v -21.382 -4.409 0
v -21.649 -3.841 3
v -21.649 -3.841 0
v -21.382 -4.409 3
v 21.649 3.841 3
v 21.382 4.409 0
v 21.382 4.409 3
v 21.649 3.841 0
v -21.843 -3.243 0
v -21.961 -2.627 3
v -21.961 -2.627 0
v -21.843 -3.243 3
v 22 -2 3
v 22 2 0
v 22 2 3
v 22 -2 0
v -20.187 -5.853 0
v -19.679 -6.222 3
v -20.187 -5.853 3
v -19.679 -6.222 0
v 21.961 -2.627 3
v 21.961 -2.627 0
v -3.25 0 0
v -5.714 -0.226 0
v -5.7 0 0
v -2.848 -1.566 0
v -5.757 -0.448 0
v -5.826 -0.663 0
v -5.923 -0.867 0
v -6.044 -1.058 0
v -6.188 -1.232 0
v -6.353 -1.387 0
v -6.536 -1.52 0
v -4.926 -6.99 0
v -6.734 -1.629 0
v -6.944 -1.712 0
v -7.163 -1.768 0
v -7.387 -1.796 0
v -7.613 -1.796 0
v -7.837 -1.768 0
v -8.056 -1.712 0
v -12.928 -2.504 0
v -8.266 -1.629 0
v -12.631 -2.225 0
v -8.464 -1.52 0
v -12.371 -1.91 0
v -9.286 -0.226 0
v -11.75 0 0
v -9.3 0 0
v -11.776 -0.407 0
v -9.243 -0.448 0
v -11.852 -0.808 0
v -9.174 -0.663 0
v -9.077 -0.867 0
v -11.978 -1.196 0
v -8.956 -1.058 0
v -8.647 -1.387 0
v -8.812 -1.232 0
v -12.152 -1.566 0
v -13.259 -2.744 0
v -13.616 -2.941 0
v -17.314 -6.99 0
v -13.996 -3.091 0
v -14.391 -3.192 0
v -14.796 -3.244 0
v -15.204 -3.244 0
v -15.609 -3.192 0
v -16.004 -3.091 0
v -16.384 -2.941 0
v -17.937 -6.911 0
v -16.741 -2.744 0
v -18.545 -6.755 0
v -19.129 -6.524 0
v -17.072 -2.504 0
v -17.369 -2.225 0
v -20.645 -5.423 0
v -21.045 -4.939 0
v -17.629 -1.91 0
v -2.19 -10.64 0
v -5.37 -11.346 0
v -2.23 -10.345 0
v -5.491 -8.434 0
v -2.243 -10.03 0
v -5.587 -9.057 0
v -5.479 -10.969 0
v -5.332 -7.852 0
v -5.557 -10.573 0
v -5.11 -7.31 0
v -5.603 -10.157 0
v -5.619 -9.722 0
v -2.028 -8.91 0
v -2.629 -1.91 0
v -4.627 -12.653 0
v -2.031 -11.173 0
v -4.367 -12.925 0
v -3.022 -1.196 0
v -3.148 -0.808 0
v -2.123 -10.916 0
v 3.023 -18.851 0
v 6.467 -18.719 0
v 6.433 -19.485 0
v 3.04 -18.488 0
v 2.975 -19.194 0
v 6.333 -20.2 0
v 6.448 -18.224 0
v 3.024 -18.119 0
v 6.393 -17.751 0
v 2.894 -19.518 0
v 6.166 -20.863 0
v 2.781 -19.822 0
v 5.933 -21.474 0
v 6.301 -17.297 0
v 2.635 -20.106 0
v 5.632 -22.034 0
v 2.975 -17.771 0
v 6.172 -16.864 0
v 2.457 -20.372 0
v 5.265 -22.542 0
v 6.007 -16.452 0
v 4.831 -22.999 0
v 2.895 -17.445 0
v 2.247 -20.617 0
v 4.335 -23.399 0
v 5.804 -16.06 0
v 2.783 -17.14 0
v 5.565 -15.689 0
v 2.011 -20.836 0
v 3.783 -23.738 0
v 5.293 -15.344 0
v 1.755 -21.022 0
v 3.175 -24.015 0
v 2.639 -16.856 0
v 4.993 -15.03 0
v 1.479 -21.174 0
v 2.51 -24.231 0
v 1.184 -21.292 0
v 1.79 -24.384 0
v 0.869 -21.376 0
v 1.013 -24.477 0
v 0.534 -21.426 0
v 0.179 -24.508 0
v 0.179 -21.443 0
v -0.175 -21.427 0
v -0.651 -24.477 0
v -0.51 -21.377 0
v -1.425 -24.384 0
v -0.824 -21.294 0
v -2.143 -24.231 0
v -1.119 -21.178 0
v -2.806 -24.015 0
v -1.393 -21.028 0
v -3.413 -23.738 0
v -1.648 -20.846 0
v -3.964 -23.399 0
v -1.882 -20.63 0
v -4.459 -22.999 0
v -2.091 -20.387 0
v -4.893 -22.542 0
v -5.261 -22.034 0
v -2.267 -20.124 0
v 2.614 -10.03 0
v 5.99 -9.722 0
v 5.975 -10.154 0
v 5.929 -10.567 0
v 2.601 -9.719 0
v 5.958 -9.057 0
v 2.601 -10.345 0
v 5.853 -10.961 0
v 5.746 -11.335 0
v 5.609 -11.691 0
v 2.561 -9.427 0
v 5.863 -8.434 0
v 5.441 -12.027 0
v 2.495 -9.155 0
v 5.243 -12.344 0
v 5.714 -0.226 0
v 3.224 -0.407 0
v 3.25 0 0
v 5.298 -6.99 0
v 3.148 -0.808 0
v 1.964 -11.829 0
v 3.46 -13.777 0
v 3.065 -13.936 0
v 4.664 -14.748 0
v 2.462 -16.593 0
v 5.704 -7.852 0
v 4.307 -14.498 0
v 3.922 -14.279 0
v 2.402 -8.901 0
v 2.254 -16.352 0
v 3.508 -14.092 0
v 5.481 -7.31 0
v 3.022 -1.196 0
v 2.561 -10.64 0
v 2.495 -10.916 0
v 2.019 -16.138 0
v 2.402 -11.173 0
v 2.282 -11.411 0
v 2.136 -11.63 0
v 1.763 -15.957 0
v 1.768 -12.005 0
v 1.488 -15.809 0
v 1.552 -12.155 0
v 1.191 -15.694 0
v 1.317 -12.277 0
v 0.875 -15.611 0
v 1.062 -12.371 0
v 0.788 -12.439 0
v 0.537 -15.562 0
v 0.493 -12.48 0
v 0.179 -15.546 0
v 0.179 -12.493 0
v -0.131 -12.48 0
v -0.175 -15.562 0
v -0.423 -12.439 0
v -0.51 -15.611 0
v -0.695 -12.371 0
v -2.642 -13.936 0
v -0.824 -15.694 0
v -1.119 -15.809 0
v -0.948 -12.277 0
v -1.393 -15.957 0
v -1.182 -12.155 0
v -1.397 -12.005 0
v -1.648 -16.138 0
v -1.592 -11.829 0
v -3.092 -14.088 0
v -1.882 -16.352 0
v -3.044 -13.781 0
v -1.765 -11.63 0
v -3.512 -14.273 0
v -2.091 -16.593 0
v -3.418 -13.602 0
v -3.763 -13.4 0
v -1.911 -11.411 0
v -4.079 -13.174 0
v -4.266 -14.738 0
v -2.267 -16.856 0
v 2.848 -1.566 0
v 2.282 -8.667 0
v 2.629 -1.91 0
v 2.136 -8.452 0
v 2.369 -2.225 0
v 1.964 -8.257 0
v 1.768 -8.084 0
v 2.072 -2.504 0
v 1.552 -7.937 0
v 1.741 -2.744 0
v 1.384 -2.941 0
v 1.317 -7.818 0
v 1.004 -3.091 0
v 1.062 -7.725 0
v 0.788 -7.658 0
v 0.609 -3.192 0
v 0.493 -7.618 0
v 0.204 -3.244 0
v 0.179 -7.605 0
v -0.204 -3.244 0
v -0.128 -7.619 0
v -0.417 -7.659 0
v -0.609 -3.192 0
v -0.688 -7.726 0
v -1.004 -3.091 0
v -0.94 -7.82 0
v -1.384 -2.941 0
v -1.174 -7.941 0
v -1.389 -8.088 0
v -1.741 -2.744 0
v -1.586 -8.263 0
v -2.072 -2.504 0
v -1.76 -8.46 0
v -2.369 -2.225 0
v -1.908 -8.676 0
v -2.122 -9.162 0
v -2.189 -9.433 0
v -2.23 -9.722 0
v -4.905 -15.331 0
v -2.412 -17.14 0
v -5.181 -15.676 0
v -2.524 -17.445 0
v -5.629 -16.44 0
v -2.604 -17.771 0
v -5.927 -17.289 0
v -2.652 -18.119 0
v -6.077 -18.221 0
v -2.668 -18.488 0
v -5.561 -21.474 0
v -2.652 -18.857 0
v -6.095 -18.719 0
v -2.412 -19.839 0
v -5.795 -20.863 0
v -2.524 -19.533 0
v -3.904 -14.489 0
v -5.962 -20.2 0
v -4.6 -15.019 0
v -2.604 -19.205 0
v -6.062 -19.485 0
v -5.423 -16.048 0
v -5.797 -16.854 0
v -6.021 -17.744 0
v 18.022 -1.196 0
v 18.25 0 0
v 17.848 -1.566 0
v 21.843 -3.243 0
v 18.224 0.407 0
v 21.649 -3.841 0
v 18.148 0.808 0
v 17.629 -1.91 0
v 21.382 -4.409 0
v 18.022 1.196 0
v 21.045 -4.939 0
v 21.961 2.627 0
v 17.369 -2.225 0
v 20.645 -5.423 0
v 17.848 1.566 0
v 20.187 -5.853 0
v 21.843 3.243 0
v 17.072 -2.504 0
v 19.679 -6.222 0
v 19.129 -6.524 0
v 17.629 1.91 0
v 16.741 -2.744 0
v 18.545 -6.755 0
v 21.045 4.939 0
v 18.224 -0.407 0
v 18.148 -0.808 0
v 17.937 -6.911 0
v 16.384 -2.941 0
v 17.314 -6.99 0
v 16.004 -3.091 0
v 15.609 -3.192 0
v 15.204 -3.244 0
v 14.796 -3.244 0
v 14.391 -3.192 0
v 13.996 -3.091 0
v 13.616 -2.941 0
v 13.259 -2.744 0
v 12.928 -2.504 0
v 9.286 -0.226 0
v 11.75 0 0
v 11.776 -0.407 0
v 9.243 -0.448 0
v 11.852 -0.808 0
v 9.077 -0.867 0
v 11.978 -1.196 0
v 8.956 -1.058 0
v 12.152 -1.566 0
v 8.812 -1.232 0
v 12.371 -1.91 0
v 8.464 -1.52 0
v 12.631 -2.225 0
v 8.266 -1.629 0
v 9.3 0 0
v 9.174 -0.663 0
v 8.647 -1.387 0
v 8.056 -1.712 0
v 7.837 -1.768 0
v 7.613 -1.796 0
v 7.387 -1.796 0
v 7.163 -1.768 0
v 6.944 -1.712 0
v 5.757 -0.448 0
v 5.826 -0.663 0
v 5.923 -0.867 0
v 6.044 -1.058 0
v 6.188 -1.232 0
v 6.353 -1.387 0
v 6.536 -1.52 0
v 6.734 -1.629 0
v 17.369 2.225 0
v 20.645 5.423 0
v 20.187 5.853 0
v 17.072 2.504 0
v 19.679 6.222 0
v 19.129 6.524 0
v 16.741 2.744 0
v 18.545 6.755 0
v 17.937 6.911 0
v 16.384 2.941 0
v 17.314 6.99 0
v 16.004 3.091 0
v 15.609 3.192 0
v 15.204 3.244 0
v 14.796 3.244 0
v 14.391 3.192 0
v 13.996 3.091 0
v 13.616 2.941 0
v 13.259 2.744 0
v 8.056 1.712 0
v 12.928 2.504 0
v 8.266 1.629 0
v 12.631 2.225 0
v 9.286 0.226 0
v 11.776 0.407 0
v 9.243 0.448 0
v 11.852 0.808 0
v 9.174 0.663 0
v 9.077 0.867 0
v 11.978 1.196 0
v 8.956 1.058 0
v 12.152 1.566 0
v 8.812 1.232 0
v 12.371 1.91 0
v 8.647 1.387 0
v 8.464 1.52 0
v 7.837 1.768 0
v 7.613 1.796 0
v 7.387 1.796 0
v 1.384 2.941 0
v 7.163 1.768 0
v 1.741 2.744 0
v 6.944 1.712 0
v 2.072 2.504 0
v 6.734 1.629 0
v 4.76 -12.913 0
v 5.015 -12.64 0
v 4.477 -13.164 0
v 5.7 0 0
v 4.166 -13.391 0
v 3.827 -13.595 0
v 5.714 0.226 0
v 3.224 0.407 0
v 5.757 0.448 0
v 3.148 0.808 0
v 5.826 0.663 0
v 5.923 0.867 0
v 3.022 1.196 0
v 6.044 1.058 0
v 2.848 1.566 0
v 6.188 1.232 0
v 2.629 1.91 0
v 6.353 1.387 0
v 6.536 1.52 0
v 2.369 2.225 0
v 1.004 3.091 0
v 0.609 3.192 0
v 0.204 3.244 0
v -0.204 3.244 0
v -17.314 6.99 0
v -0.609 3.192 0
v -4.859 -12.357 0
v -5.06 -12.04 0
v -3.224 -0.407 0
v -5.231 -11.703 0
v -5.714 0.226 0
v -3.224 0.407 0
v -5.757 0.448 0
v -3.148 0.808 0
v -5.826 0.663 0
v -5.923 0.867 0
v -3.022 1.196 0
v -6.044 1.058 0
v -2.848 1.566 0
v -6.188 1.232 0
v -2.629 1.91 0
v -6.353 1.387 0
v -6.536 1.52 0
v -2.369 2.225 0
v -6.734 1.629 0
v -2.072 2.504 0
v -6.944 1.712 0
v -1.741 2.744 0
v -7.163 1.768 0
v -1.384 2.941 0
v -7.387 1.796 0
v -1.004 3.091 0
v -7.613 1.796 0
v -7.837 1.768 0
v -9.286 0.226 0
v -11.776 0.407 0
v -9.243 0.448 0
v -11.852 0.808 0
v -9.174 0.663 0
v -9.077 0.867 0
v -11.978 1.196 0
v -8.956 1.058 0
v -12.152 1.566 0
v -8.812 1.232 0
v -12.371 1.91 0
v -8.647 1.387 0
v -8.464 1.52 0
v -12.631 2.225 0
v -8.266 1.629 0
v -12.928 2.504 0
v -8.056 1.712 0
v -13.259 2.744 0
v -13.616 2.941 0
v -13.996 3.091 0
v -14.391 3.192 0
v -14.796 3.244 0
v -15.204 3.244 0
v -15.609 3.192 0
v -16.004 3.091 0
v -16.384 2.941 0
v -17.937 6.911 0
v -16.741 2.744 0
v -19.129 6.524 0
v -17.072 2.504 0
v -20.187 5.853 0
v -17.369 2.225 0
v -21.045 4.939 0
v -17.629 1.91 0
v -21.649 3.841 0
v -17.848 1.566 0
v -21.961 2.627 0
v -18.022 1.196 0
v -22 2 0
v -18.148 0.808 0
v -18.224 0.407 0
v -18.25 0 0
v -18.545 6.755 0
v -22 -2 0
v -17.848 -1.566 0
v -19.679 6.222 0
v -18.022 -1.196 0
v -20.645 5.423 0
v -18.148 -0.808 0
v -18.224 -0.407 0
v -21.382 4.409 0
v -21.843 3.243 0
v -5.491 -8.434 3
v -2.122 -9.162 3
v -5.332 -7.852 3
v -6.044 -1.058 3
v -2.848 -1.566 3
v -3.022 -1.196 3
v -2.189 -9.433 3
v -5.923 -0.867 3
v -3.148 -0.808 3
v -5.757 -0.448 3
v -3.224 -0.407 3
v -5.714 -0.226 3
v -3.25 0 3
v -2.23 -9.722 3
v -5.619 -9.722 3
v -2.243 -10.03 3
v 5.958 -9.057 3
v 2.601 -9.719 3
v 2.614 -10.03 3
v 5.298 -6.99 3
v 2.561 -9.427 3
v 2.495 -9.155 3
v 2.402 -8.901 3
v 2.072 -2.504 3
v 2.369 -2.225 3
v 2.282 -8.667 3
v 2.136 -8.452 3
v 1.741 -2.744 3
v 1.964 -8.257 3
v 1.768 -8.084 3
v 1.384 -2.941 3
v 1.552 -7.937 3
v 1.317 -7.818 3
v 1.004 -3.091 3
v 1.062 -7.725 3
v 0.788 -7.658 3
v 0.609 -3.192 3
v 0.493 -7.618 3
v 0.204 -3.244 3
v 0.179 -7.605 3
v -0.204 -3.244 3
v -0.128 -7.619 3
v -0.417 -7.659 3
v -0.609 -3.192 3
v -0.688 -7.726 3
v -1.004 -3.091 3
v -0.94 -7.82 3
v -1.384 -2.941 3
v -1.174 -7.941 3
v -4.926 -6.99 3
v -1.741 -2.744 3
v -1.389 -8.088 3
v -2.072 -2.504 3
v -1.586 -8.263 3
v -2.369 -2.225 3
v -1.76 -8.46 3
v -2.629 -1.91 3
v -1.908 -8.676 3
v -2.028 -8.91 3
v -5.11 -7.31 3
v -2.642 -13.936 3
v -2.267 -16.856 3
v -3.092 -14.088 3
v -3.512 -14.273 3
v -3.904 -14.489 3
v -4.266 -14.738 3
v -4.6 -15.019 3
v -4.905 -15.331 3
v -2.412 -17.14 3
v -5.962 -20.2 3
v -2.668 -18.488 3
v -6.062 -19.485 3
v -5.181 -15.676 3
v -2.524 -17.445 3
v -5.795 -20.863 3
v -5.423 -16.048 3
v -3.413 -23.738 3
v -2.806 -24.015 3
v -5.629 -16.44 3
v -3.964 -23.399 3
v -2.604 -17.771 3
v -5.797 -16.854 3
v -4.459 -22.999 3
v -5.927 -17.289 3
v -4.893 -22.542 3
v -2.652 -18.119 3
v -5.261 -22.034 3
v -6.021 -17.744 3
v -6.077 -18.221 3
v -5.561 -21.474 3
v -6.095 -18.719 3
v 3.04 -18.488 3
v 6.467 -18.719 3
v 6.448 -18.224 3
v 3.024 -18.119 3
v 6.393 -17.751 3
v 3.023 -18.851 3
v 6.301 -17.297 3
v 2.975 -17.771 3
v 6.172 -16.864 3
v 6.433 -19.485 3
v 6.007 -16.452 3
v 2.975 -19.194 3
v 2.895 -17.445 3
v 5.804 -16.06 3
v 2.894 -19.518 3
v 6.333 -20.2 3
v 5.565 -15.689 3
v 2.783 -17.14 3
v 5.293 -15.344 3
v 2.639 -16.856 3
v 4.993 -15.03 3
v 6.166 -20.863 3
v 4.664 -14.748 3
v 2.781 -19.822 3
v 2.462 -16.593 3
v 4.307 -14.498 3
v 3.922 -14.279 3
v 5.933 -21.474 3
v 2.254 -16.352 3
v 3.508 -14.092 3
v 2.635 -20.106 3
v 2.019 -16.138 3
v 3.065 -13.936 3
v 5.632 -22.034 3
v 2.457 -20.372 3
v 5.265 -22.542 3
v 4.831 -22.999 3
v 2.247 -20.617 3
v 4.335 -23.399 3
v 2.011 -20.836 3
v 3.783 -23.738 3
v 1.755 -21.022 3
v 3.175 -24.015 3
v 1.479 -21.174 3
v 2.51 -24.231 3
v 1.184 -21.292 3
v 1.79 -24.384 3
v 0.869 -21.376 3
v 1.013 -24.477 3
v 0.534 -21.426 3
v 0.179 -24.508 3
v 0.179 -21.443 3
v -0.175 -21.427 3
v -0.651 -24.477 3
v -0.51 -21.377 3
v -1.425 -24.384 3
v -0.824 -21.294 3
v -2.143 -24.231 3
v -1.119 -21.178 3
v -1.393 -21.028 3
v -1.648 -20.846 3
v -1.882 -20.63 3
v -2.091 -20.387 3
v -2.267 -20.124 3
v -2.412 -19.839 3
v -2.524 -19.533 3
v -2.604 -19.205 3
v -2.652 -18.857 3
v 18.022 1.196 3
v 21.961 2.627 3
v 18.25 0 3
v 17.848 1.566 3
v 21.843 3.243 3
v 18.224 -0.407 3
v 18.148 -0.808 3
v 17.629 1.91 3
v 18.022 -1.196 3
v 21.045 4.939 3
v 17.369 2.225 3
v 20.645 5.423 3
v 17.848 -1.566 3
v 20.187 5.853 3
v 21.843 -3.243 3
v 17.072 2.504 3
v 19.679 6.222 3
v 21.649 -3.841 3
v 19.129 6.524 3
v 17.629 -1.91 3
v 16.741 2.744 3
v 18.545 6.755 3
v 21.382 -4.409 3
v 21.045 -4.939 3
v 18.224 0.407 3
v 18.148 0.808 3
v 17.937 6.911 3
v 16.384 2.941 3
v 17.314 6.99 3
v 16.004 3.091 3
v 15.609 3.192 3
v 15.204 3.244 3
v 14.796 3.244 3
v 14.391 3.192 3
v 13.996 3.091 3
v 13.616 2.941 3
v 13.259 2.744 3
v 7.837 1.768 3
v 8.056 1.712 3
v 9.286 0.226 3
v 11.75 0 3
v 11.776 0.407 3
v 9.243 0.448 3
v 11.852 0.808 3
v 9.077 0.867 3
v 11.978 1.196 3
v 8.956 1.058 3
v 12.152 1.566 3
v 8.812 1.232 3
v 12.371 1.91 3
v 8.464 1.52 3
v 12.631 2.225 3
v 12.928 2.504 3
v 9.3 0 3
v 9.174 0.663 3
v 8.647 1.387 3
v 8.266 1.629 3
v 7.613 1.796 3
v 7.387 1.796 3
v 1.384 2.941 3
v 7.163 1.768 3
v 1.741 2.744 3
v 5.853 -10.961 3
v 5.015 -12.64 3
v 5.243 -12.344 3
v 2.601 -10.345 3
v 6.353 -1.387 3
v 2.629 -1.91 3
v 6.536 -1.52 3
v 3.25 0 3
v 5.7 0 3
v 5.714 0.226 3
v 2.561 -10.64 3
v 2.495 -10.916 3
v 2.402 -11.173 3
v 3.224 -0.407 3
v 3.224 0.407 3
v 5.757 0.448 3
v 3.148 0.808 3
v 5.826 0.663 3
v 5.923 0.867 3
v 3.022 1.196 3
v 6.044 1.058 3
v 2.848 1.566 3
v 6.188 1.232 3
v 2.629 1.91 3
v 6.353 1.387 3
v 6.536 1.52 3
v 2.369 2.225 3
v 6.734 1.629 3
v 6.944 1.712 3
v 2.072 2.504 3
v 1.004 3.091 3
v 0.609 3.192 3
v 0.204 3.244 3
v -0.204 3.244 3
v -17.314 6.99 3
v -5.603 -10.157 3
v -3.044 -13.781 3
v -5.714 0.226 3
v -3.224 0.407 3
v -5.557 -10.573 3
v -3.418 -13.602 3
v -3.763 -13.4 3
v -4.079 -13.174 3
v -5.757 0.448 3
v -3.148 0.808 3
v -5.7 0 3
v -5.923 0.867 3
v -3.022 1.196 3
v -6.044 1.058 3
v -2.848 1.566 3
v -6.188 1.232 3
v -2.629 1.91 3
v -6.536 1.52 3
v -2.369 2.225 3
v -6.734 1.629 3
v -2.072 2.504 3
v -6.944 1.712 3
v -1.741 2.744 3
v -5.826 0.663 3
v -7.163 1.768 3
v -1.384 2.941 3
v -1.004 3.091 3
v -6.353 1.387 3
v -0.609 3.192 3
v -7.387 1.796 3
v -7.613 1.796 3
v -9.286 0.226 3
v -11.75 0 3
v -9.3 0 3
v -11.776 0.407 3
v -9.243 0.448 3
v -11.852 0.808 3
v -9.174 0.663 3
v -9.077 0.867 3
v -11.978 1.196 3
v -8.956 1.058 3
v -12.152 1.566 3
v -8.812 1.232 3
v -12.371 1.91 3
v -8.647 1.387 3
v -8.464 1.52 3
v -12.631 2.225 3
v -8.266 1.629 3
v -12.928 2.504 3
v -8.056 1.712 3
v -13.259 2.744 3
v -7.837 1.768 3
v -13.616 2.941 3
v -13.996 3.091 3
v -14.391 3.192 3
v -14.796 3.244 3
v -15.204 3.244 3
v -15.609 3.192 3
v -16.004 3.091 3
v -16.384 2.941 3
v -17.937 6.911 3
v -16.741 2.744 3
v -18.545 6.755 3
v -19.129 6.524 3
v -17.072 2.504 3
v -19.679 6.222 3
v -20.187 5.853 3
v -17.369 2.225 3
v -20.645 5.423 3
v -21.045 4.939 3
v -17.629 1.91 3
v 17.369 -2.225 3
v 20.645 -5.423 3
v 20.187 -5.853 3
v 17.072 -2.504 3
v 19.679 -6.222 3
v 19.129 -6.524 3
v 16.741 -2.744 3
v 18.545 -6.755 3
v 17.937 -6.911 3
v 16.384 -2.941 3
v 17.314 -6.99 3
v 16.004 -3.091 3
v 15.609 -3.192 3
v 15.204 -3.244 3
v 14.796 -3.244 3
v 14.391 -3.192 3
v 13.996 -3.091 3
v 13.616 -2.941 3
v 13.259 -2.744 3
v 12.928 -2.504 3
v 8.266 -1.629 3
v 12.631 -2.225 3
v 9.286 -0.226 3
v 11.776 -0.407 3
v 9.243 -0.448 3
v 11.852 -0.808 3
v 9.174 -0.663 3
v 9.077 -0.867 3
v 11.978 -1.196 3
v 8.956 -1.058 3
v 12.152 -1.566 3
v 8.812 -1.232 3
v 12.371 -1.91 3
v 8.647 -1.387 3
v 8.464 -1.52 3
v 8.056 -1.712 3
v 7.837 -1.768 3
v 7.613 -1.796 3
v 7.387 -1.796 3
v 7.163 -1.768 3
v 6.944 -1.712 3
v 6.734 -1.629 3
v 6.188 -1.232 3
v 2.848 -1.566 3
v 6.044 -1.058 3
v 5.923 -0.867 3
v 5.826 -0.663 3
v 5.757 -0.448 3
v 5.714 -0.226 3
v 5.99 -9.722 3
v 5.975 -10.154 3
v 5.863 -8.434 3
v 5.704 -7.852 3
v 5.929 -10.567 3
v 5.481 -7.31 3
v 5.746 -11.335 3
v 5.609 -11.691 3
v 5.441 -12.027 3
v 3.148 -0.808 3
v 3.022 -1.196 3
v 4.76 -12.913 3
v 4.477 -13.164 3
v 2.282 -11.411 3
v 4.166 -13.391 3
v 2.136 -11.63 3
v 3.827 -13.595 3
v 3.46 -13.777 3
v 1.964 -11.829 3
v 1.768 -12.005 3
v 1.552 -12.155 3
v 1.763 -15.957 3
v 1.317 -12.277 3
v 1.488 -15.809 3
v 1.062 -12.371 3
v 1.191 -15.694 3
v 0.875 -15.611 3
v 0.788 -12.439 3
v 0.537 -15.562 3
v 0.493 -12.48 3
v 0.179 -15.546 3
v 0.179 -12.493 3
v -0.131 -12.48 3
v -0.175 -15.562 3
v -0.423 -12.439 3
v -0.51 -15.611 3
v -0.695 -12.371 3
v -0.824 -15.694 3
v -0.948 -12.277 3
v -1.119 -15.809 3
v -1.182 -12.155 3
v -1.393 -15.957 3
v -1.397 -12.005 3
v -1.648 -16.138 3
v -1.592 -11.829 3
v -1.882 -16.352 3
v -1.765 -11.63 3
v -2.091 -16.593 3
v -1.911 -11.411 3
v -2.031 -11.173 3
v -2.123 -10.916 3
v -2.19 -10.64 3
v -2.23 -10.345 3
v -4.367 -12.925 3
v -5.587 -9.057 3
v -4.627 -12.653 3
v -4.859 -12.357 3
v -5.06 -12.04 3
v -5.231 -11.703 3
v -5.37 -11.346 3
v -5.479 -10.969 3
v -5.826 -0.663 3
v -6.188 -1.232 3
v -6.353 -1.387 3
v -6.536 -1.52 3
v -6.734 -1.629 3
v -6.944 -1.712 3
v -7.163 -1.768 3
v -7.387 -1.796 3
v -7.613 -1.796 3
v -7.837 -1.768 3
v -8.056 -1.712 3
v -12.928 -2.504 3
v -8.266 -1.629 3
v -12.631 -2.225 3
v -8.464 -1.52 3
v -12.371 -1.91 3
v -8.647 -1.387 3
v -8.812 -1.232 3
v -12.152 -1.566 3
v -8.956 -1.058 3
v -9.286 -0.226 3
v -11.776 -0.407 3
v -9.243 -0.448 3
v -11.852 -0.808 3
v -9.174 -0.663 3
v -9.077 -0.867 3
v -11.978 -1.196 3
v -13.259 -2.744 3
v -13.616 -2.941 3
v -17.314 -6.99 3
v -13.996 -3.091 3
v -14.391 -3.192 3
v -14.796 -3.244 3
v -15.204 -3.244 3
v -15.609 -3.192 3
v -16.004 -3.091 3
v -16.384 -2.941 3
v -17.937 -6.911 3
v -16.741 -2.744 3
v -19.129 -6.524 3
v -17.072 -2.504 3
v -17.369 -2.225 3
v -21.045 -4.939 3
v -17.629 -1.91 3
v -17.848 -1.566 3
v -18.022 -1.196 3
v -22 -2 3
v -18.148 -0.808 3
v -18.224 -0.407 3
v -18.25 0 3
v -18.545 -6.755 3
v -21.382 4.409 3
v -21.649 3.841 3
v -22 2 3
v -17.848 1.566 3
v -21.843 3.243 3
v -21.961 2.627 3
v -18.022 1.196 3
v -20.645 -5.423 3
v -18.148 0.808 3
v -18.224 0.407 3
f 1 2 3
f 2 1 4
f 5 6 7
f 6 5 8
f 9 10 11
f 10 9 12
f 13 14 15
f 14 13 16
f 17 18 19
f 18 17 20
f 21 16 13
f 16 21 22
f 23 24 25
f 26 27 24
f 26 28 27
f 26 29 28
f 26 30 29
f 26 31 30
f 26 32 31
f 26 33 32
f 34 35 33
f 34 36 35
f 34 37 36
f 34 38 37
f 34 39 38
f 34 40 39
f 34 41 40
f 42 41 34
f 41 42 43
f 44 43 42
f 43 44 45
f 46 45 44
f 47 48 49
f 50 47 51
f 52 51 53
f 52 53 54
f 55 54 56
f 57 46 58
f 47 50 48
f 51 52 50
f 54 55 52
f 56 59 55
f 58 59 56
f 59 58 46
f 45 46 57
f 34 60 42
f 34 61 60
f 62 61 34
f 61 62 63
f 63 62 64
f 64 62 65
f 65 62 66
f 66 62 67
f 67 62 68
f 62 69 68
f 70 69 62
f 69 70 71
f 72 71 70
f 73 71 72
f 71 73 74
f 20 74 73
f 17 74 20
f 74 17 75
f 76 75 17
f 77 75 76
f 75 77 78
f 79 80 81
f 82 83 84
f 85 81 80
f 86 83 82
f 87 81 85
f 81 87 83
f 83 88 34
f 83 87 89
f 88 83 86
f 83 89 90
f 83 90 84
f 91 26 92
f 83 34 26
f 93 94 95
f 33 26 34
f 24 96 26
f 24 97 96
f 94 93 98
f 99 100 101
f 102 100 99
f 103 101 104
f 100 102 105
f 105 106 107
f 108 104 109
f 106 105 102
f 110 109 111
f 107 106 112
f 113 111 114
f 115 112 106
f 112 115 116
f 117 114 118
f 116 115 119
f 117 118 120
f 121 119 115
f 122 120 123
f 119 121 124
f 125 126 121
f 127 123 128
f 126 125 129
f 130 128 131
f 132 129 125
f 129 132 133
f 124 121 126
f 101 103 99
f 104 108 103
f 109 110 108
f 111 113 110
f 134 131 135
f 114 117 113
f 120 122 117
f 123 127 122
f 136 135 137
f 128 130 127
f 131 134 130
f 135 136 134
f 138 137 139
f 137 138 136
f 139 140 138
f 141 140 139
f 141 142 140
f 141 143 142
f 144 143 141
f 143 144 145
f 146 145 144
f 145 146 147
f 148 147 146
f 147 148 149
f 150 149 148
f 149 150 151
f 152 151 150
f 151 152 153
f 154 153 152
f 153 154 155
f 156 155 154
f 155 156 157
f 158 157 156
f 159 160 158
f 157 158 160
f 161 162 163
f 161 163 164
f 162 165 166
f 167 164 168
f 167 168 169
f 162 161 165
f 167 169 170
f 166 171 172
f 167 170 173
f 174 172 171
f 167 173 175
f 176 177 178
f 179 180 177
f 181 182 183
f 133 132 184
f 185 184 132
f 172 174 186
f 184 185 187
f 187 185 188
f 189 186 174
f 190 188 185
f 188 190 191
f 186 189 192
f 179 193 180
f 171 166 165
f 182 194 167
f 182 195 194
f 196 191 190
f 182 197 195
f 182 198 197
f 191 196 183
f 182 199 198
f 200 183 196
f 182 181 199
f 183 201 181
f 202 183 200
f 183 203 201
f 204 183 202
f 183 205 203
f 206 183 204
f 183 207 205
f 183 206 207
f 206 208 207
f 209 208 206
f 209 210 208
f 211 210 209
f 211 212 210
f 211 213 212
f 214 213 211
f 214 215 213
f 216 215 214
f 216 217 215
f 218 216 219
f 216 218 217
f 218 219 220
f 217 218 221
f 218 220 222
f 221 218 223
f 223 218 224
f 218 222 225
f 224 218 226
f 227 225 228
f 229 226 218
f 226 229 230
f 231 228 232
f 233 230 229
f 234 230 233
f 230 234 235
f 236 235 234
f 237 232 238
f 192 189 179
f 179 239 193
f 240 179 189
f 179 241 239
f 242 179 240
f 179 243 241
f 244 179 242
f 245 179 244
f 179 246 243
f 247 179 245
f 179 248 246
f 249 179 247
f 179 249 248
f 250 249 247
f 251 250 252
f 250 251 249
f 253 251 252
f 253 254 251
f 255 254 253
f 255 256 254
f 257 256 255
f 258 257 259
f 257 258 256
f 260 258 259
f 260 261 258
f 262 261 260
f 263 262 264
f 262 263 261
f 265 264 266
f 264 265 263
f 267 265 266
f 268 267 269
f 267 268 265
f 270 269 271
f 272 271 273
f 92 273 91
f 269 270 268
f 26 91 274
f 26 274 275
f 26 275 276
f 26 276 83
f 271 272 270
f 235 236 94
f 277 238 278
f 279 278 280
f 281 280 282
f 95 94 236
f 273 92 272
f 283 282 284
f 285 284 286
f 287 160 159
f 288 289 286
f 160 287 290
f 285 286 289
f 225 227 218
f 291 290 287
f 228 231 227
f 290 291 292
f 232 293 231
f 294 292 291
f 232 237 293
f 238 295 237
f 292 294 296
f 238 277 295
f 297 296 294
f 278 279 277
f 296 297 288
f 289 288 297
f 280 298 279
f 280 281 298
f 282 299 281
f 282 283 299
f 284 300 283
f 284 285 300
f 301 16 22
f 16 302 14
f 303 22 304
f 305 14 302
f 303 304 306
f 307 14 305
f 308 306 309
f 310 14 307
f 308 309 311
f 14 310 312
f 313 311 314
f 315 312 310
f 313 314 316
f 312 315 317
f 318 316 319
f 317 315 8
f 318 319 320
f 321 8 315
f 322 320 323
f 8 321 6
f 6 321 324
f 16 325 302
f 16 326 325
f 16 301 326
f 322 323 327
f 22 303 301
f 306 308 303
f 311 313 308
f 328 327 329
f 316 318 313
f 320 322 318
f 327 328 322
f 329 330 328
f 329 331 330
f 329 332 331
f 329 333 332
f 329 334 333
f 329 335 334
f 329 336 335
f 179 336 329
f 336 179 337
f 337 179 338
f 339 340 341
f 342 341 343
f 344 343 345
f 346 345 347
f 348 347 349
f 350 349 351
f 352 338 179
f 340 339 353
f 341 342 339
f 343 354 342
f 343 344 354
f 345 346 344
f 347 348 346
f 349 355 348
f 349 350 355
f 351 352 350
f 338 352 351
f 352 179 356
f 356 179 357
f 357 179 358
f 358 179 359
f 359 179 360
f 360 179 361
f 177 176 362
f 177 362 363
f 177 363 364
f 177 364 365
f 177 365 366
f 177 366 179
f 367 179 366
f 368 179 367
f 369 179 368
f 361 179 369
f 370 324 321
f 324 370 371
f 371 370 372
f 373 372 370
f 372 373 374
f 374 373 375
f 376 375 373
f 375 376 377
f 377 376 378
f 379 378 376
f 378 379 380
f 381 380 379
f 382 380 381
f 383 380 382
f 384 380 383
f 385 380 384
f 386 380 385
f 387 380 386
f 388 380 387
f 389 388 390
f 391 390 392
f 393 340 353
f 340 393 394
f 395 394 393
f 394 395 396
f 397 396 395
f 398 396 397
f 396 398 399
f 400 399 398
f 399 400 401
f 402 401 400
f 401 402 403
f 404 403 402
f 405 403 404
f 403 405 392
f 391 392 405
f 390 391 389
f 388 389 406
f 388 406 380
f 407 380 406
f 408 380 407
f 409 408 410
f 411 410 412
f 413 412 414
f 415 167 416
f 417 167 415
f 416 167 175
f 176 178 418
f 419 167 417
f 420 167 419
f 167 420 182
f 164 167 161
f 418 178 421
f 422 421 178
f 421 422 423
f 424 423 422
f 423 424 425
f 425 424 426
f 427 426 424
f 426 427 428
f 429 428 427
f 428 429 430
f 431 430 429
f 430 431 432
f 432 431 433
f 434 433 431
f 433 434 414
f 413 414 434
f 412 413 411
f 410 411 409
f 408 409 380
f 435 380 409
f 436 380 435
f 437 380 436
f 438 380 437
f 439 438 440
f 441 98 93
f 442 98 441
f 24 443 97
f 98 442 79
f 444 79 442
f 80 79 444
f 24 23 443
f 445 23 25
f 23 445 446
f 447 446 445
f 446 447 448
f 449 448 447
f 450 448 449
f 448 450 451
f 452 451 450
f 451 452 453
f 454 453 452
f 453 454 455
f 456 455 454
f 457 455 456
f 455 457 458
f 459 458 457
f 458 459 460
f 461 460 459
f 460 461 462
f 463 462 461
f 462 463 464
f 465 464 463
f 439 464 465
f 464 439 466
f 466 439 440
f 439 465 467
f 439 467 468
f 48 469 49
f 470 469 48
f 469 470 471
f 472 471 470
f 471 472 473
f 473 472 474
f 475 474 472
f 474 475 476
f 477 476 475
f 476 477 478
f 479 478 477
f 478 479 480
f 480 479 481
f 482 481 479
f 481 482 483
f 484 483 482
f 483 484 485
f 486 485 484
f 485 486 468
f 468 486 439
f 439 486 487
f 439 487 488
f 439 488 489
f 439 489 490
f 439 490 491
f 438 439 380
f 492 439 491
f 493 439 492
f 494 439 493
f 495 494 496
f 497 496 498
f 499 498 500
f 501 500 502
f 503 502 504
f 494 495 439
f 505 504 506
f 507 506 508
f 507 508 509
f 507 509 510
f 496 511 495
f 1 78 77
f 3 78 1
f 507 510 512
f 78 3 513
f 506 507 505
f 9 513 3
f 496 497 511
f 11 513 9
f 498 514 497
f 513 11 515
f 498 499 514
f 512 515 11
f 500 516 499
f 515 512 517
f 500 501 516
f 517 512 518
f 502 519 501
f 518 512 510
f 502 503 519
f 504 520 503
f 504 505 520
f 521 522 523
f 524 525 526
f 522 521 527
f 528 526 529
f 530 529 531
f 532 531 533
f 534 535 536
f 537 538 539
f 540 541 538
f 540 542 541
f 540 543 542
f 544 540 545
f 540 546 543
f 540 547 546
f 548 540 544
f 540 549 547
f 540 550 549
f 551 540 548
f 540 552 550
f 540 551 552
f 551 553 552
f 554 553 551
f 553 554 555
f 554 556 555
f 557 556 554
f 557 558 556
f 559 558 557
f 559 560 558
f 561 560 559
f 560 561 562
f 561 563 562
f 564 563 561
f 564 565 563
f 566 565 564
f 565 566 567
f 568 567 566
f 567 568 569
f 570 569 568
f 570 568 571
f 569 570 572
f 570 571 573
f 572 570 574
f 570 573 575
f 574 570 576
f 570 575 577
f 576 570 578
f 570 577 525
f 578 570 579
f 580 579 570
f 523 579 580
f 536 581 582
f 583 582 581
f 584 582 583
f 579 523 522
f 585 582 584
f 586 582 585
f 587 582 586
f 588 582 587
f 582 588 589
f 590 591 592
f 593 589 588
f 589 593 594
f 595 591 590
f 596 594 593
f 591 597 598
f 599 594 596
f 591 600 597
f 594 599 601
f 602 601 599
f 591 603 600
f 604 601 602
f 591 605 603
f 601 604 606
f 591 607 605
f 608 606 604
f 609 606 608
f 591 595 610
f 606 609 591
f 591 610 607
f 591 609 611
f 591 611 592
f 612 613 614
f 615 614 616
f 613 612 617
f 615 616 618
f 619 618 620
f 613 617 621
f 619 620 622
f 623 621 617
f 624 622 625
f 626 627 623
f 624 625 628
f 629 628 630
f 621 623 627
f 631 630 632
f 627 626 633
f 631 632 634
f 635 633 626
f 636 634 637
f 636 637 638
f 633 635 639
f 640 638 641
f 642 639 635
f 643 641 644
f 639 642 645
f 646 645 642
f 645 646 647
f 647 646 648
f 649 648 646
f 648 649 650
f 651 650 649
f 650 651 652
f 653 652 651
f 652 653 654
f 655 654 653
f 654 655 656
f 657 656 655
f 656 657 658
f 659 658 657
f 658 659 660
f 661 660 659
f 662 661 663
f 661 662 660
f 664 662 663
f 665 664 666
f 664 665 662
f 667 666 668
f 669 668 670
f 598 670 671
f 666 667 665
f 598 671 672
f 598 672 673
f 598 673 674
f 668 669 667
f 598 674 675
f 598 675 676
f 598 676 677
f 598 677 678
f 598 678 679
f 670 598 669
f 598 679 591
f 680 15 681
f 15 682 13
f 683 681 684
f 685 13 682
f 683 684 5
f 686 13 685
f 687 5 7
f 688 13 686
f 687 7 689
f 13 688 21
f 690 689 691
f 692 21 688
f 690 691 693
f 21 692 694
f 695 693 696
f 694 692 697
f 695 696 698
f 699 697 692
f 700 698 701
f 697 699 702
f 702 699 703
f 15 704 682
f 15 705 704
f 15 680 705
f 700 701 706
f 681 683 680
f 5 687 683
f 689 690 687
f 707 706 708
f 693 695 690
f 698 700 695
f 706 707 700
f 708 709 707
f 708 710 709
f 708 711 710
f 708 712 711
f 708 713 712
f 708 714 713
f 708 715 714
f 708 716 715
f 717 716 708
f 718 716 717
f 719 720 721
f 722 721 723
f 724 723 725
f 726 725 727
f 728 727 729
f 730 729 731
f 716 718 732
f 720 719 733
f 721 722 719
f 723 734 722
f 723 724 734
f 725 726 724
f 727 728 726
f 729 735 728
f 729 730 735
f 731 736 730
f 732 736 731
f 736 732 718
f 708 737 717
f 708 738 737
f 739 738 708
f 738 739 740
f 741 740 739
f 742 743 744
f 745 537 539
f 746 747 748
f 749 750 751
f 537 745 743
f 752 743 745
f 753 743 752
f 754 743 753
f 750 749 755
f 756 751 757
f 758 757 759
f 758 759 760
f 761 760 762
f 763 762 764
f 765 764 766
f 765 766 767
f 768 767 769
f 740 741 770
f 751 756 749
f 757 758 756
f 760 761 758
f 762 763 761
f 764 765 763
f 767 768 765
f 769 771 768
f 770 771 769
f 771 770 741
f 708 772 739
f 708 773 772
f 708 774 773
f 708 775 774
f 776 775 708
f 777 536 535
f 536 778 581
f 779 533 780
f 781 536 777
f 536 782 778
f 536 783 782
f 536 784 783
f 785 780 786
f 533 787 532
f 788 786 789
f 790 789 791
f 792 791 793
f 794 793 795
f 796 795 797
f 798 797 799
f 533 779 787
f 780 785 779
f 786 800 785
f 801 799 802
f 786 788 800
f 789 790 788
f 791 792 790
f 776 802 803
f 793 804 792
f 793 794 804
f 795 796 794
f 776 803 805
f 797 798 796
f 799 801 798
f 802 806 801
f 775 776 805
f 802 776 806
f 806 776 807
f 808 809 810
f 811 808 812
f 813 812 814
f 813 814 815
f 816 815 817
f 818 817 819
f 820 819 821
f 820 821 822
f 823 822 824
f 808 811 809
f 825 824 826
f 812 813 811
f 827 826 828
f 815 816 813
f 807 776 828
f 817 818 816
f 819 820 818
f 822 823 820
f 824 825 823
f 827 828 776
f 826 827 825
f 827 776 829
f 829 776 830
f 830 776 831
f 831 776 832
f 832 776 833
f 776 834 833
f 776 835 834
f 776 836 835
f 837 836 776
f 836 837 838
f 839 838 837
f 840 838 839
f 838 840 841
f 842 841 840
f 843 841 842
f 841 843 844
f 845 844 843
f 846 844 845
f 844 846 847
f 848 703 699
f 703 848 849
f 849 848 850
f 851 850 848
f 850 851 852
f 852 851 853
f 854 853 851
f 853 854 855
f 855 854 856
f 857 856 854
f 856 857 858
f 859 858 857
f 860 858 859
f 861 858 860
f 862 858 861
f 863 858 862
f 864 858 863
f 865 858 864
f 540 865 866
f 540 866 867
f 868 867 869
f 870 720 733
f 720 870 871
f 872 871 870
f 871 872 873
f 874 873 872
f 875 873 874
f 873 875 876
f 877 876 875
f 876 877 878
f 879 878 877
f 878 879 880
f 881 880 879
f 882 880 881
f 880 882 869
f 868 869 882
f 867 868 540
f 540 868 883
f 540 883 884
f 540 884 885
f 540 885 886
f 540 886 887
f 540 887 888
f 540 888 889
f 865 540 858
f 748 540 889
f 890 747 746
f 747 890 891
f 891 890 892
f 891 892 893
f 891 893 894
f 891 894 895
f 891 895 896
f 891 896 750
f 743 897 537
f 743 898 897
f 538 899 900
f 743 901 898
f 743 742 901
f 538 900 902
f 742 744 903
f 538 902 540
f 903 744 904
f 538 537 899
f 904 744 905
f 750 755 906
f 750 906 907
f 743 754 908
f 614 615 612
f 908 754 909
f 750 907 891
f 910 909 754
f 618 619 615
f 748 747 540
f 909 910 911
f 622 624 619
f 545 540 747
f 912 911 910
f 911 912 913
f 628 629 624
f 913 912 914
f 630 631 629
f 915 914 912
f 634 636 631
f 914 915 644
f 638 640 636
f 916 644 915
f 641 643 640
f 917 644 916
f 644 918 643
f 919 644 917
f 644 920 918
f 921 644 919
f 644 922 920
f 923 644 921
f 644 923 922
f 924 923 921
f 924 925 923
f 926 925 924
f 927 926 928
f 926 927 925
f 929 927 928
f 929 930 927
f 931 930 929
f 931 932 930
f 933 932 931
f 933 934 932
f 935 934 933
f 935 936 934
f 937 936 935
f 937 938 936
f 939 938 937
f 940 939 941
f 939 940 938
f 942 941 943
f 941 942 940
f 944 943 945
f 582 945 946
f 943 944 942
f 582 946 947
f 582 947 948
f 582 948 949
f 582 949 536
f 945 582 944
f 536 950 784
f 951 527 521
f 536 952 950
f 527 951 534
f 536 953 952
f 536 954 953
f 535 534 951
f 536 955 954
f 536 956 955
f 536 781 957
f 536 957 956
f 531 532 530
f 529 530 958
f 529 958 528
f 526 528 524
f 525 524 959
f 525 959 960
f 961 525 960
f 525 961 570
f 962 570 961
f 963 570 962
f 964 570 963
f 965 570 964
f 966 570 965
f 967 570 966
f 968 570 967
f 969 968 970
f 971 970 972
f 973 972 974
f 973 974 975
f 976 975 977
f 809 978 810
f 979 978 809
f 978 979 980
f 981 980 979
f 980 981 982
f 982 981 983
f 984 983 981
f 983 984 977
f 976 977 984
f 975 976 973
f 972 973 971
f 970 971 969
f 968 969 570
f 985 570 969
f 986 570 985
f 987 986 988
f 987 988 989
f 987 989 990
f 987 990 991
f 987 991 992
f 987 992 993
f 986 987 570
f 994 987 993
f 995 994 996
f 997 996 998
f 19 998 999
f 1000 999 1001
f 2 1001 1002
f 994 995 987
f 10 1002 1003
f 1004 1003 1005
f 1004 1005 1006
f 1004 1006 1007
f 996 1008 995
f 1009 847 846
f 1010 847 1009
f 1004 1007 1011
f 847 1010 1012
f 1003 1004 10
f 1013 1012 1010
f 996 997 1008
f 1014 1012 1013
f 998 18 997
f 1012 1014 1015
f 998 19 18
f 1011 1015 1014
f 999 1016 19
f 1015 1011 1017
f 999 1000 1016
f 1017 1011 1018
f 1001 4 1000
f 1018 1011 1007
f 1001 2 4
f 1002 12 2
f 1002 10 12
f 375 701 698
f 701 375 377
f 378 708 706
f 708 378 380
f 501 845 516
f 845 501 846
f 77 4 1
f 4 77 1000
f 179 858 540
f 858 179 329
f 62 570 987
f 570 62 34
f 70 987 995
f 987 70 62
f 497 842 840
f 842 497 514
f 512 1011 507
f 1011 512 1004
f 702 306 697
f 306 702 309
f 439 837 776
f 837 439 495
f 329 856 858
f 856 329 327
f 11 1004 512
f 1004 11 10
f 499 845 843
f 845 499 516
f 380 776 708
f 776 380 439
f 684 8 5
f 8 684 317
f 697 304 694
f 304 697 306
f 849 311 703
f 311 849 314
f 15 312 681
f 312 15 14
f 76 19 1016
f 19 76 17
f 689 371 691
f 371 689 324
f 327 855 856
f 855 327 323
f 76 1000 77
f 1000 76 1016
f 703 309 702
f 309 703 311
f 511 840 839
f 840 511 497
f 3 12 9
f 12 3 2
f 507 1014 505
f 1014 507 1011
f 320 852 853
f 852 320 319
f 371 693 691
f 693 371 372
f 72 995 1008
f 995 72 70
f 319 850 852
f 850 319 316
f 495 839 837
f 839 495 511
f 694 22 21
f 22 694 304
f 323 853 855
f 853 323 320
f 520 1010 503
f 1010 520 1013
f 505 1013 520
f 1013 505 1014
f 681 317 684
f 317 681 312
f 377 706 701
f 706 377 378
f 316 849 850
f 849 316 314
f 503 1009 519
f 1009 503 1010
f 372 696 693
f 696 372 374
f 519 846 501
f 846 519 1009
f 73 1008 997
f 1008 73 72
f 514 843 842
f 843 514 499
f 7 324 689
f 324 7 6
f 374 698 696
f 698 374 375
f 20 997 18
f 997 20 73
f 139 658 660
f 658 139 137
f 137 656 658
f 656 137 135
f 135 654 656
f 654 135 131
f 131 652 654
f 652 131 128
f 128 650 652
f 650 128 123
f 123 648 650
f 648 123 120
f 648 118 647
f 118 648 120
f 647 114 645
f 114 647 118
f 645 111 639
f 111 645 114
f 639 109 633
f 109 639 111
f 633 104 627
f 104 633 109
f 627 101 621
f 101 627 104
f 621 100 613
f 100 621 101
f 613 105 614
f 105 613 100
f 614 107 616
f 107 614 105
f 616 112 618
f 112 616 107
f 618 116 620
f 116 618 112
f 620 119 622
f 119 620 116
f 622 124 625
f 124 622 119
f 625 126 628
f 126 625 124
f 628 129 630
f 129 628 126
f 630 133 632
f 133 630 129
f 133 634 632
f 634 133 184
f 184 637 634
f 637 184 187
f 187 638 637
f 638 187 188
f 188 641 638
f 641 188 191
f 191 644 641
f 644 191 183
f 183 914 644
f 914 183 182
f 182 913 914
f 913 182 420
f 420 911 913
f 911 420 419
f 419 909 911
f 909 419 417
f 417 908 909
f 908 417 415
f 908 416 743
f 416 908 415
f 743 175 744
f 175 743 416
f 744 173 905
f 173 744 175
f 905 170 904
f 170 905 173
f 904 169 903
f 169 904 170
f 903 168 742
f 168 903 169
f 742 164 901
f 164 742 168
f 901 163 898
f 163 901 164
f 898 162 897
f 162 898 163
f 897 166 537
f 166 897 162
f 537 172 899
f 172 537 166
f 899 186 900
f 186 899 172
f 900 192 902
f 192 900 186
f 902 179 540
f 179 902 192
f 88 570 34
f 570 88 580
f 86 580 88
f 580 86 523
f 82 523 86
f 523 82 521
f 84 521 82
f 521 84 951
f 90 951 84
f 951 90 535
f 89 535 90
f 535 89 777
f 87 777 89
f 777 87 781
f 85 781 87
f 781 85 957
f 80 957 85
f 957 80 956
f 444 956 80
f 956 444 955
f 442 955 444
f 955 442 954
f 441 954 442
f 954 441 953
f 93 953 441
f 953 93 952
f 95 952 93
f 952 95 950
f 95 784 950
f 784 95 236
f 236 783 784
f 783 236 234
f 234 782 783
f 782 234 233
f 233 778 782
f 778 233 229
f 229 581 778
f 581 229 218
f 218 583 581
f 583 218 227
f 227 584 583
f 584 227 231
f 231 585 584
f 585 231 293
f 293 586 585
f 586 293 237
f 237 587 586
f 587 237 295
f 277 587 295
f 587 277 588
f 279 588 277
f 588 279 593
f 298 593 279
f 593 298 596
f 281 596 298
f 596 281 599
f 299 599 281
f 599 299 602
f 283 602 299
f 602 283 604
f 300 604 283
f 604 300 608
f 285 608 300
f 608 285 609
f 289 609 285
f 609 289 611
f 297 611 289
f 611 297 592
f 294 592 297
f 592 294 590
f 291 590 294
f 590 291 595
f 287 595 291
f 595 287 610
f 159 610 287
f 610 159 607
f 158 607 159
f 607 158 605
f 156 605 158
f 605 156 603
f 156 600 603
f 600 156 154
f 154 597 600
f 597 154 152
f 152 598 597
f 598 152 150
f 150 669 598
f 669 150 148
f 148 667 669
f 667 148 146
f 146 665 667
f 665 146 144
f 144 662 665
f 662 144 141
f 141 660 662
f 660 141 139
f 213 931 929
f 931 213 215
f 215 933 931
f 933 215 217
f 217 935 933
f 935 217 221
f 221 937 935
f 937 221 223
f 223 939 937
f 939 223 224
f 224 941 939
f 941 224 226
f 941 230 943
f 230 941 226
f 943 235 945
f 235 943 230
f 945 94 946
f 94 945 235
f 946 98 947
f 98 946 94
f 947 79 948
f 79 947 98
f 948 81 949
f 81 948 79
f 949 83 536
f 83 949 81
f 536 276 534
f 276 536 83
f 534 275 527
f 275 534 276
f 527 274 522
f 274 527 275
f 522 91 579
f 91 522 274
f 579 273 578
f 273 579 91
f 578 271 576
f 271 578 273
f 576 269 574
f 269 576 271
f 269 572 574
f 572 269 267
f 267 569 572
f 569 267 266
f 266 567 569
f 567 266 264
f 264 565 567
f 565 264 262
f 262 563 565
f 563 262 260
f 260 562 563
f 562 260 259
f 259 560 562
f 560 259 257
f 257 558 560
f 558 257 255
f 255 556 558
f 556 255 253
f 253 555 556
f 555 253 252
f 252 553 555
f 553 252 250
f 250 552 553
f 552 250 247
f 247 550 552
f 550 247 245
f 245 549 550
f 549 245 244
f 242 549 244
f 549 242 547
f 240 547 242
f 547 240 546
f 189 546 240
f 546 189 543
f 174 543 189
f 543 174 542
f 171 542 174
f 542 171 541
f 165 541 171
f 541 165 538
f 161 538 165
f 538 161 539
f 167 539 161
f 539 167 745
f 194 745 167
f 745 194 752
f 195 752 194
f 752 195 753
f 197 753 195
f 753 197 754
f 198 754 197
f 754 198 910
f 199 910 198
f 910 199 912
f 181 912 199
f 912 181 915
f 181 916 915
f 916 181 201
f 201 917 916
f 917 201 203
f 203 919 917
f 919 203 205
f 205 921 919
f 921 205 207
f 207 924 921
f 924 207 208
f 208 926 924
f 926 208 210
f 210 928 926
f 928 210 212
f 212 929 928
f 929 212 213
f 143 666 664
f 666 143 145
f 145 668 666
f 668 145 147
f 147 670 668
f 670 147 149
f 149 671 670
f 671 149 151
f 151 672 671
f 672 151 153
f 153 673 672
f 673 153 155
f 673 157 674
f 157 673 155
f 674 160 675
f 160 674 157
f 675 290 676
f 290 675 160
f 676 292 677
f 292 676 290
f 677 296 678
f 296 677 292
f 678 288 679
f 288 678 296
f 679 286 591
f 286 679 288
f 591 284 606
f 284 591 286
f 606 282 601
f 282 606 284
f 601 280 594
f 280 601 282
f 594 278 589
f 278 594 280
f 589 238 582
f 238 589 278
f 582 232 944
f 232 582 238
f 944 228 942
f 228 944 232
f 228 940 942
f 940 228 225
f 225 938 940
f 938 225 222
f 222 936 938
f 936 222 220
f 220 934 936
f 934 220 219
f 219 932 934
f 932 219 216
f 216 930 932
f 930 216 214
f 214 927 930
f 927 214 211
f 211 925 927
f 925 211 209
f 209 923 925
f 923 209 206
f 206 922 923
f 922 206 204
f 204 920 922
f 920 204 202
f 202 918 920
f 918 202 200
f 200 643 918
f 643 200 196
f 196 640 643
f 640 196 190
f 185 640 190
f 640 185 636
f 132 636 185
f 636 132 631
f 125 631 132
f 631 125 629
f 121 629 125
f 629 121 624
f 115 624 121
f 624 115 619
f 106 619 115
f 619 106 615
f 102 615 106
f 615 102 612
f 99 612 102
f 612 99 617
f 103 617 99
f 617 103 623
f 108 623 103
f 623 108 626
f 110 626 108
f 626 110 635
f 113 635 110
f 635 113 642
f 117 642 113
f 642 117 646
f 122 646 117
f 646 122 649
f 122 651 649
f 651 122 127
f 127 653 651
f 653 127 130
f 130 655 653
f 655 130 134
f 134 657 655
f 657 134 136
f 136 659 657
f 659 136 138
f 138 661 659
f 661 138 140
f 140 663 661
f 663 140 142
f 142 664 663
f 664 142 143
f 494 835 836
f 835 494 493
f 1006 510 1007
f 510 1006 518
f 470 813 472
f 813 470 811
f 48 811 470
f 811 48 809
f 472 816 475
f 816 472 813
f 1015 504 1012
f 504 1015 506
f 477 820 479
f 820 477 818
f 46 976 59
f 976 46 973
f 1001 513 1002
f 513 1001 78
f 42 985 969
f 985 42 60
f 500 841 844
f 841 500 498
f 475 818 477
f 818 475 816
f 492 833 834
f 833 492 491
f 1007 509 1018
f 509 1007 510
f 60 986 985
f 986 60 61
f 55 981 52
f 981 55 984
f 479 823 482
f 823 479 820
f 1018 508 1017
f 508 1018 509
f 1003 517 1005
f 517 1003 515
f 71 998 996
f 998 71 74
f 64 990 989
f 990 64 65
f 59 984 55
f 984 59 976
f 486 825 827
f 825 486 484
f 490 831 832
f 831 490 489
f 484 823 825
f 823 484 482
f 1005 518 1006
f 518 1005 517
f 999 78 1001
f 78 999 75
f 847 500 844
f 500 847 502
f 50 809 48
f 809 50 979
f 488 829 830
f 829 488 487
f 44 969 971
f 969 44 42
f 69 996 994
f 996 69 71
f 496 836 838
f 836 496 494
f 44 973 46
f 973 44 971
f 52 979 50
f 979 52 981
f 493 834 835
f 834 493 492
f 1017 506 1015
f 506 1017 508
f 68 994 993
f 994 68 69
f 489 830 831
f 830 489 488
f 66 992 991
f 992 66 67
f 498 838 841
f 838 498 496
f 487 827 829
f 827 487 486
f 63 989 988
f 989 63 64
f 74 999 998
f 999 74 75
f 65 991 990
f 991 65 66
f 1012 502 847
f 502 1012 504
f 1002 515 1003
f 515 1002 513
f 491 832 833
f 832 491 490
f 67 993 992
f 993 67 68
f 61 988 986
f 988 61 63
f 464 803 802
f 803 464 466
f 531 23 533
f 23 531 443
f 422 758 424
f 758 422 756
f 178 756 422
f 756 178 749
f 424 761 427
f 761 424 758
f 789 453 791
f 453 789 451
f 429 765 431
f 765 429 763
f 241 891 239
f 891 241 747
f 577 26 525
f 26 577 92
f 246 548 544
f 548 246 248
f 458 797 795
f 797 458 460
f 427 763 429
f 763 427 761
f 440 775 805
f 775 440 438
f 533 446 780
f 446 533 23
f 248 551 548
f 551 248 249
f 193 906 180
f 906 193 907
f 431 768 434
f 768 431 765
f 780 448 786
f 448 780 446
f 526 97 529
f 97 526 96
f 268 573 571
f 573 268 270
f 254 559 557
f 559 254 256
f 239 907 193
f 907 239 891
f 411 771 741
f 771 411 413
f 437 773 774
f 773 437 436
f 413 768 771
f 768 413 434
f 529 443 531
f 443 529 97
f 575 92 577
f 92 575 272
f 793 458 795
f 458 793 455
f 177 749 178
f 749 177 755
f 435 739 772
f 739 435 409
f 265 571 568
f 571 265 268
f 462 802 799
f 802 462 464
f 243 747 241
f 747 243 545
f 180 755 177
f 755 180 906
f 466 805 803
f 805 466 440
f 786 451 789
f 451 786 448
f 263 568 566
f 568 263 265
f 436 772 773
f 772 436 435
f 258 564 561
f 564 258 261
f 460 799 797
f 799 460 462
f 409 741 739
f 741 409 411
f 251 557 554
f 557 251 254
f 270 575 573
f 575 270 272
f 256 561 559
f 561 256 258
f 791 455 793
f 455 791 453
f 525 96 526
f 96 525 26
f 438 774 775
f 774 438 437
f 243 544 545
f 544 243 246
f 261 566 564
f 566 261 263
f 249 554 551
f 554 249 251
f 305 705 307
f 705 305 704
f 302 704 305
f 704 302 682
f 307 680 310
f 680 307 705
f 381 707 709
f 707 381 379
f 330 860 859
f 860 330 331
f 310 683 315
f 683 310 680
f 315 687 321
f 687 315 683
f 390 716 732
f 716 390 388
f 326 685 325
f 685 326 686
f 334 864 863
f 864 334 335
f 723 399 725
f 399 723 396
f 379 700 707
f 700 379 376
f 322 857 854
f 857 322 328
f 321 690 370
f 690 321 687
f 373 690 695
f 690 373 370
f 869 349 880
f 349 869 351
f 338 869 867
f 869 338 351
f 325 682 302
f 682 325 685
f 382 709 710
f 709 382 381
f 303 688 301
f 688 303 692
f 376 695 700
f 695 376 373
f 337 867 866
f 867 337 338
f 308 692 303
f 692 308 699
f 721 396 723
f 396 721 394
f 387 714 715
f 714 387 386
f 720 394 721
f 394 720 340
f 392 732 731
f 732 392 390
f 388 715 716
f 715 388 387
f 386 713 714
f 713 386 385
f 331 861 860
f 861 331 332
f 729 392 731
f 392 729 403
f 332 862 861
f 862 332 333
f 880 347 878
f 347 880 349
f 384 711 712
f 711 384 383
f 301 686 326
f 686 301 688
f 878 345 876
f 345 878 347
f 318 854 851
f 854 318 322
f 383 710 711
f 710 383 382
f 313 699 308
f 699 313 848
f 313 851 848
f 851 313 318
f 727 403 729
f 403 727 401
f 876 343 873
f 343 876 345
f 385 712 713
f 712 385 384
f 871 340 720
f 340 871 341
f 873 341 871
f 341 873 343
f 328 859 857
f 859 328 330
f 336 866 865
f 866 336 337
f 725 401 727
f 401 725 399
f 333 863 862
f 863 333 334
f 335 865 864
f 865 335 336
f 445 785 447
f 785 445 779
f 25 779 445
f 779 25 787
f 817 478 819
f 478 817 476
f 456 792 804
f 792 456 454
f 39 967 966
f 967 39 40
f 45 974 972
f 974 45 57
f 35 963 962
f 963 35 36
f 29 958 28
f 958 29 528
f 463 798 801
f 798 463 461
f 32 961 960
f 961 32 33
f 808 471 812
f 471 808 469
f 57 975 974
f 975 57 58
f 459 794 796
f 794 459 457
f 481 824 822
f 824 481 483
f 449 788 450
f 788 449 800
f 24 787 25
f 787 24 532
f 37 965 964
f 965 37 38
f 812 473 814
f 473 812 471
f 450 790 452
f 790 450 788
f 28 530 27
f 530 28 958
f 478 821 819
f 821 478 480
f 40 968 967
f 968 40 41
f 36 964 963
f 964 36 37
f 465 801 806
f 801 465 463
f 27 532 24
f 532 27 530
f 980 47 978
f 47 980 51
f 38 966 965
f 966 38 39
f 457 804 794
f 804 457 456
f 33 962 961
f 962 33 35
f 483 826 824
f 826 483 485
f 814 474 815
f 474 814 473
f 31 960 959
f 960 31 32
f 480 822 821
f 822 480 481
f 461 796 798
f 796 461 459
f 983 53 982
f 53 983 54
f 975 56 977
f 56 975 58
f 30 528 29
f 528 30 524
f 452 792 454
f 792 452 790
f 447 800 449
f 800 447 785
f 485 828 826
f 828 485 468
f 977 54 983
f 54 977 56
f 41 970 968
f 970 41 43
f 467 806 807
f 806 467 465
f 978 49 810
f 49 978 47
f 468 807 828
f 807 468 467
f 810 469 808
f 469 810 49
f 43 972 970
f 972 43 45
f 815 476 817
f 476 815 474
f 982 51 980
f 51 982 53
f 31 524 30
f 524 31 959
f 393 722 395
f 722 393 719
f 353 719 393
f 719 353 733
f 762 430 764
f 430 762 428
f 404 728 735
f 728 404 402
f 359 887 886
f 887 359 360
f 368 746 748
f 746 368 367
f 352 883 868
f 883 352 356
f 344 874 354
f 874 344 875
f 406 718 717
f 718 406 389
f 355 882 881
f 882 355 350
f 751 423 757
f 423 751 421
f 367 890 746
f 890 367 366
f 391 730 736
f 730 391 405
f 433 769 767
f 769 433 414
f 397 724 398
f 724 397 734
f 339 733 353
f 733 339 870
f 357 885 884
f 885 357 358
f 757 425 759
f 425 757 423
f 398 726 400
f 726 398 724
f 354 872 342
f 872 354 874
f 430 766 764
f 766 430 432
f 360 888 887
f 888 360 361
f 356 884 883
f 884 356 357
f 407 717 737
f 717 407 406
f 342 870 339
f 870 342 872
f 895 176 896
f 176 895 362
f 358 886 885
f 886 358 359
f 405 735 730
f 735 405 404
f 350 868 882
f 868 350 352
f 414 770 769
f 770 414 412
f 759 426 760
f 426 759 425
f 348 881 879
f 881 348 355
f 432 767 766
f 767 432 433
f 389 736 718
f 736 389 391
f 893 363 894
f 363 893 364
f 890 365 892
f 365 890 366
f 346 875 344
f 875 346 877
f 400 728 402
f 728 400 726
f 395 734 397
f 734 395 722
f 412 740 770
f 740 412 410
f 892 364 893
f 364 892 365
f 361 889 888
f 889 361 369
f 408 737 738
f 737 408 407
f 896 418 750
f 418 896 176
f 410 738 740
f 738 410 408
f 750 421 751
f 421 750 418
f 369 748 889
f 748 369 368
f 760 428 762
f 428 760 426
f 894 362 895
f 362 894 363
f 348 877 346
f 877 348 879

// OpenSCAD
$fn = 50;


difference() {
	union() {
		hull() {
			translate(v = [-17.0000000000, 2.0000000000, 0]) {
				cylinder(h = 3, r = 5);
			}
			translate(v = [17.0000000000, 2.0000000000, 0]) {
				cylinder(h = 3, r = 5);
			}
			translate(v = [-17.0000000000, -2.0000000000, 0]) {
				cylinder(h = 3, r = 5);
			}
			translate(v = [17.0000000000, -2.0000000000, 0]) {
				cylinder(h = 3, r = 5);
			}
		}
		translate(v = [0, -5, 0]) {
			linear_extrude(height = 3) {
				text(font = "DejaVu Sans Mono:style=Bold", halign = "center", size = 19.0000000000, text = "8", valign = "top");
			}
		}
	}
	union() {
		translate(v = [-15.0000000000, 0.0000000000, 0]) {
			translate(v = [0, 0, -100]) {
				cylinder(h = 200, r = 3.2500000000);
			}
		}
		translate(v = [0, 0, -100]) {
			cylinder(h = 200, r = 3.2500000000);
		}
		translate(v = [15.0000000000, 0.0000000000, 0]) {
			translate(v = [0, 0, -100]) {
				cylinder(h = 200, r = 3.2500000000);
			}
		}
		translate(v = [-15.0000000000, 0.0000000000, 0]) {
			translate(v = [0, 0, -100]) {
				cylinder(h = 200, r = 1.8000000000);
			}
		}
		translate(v = [-7.5000000000, 0.0000000000, 0]) {
			translate(v = [0, 0, -100]) {
				cylinder(h = 200, r = 1.8000000000);
			}
		}
		translate(v = [0, 0, -100]) {
			cylinder(h = 200, r = 1.8000000000);
		}
		translate(v = [7.5000000000, 0.0000000000, 0]) {
			translate(v = [0, 0, -100]) {
				cylinder(h = 200, r = 1.8000000000);
			}
		}
		translate(v = [15.0000000000, 0.0000000000, 0]) {
			translate(v = [0, 0, -100]) {
				cylinder(h = 200, r = 1.8000000000);
			}
		}
	}
}
